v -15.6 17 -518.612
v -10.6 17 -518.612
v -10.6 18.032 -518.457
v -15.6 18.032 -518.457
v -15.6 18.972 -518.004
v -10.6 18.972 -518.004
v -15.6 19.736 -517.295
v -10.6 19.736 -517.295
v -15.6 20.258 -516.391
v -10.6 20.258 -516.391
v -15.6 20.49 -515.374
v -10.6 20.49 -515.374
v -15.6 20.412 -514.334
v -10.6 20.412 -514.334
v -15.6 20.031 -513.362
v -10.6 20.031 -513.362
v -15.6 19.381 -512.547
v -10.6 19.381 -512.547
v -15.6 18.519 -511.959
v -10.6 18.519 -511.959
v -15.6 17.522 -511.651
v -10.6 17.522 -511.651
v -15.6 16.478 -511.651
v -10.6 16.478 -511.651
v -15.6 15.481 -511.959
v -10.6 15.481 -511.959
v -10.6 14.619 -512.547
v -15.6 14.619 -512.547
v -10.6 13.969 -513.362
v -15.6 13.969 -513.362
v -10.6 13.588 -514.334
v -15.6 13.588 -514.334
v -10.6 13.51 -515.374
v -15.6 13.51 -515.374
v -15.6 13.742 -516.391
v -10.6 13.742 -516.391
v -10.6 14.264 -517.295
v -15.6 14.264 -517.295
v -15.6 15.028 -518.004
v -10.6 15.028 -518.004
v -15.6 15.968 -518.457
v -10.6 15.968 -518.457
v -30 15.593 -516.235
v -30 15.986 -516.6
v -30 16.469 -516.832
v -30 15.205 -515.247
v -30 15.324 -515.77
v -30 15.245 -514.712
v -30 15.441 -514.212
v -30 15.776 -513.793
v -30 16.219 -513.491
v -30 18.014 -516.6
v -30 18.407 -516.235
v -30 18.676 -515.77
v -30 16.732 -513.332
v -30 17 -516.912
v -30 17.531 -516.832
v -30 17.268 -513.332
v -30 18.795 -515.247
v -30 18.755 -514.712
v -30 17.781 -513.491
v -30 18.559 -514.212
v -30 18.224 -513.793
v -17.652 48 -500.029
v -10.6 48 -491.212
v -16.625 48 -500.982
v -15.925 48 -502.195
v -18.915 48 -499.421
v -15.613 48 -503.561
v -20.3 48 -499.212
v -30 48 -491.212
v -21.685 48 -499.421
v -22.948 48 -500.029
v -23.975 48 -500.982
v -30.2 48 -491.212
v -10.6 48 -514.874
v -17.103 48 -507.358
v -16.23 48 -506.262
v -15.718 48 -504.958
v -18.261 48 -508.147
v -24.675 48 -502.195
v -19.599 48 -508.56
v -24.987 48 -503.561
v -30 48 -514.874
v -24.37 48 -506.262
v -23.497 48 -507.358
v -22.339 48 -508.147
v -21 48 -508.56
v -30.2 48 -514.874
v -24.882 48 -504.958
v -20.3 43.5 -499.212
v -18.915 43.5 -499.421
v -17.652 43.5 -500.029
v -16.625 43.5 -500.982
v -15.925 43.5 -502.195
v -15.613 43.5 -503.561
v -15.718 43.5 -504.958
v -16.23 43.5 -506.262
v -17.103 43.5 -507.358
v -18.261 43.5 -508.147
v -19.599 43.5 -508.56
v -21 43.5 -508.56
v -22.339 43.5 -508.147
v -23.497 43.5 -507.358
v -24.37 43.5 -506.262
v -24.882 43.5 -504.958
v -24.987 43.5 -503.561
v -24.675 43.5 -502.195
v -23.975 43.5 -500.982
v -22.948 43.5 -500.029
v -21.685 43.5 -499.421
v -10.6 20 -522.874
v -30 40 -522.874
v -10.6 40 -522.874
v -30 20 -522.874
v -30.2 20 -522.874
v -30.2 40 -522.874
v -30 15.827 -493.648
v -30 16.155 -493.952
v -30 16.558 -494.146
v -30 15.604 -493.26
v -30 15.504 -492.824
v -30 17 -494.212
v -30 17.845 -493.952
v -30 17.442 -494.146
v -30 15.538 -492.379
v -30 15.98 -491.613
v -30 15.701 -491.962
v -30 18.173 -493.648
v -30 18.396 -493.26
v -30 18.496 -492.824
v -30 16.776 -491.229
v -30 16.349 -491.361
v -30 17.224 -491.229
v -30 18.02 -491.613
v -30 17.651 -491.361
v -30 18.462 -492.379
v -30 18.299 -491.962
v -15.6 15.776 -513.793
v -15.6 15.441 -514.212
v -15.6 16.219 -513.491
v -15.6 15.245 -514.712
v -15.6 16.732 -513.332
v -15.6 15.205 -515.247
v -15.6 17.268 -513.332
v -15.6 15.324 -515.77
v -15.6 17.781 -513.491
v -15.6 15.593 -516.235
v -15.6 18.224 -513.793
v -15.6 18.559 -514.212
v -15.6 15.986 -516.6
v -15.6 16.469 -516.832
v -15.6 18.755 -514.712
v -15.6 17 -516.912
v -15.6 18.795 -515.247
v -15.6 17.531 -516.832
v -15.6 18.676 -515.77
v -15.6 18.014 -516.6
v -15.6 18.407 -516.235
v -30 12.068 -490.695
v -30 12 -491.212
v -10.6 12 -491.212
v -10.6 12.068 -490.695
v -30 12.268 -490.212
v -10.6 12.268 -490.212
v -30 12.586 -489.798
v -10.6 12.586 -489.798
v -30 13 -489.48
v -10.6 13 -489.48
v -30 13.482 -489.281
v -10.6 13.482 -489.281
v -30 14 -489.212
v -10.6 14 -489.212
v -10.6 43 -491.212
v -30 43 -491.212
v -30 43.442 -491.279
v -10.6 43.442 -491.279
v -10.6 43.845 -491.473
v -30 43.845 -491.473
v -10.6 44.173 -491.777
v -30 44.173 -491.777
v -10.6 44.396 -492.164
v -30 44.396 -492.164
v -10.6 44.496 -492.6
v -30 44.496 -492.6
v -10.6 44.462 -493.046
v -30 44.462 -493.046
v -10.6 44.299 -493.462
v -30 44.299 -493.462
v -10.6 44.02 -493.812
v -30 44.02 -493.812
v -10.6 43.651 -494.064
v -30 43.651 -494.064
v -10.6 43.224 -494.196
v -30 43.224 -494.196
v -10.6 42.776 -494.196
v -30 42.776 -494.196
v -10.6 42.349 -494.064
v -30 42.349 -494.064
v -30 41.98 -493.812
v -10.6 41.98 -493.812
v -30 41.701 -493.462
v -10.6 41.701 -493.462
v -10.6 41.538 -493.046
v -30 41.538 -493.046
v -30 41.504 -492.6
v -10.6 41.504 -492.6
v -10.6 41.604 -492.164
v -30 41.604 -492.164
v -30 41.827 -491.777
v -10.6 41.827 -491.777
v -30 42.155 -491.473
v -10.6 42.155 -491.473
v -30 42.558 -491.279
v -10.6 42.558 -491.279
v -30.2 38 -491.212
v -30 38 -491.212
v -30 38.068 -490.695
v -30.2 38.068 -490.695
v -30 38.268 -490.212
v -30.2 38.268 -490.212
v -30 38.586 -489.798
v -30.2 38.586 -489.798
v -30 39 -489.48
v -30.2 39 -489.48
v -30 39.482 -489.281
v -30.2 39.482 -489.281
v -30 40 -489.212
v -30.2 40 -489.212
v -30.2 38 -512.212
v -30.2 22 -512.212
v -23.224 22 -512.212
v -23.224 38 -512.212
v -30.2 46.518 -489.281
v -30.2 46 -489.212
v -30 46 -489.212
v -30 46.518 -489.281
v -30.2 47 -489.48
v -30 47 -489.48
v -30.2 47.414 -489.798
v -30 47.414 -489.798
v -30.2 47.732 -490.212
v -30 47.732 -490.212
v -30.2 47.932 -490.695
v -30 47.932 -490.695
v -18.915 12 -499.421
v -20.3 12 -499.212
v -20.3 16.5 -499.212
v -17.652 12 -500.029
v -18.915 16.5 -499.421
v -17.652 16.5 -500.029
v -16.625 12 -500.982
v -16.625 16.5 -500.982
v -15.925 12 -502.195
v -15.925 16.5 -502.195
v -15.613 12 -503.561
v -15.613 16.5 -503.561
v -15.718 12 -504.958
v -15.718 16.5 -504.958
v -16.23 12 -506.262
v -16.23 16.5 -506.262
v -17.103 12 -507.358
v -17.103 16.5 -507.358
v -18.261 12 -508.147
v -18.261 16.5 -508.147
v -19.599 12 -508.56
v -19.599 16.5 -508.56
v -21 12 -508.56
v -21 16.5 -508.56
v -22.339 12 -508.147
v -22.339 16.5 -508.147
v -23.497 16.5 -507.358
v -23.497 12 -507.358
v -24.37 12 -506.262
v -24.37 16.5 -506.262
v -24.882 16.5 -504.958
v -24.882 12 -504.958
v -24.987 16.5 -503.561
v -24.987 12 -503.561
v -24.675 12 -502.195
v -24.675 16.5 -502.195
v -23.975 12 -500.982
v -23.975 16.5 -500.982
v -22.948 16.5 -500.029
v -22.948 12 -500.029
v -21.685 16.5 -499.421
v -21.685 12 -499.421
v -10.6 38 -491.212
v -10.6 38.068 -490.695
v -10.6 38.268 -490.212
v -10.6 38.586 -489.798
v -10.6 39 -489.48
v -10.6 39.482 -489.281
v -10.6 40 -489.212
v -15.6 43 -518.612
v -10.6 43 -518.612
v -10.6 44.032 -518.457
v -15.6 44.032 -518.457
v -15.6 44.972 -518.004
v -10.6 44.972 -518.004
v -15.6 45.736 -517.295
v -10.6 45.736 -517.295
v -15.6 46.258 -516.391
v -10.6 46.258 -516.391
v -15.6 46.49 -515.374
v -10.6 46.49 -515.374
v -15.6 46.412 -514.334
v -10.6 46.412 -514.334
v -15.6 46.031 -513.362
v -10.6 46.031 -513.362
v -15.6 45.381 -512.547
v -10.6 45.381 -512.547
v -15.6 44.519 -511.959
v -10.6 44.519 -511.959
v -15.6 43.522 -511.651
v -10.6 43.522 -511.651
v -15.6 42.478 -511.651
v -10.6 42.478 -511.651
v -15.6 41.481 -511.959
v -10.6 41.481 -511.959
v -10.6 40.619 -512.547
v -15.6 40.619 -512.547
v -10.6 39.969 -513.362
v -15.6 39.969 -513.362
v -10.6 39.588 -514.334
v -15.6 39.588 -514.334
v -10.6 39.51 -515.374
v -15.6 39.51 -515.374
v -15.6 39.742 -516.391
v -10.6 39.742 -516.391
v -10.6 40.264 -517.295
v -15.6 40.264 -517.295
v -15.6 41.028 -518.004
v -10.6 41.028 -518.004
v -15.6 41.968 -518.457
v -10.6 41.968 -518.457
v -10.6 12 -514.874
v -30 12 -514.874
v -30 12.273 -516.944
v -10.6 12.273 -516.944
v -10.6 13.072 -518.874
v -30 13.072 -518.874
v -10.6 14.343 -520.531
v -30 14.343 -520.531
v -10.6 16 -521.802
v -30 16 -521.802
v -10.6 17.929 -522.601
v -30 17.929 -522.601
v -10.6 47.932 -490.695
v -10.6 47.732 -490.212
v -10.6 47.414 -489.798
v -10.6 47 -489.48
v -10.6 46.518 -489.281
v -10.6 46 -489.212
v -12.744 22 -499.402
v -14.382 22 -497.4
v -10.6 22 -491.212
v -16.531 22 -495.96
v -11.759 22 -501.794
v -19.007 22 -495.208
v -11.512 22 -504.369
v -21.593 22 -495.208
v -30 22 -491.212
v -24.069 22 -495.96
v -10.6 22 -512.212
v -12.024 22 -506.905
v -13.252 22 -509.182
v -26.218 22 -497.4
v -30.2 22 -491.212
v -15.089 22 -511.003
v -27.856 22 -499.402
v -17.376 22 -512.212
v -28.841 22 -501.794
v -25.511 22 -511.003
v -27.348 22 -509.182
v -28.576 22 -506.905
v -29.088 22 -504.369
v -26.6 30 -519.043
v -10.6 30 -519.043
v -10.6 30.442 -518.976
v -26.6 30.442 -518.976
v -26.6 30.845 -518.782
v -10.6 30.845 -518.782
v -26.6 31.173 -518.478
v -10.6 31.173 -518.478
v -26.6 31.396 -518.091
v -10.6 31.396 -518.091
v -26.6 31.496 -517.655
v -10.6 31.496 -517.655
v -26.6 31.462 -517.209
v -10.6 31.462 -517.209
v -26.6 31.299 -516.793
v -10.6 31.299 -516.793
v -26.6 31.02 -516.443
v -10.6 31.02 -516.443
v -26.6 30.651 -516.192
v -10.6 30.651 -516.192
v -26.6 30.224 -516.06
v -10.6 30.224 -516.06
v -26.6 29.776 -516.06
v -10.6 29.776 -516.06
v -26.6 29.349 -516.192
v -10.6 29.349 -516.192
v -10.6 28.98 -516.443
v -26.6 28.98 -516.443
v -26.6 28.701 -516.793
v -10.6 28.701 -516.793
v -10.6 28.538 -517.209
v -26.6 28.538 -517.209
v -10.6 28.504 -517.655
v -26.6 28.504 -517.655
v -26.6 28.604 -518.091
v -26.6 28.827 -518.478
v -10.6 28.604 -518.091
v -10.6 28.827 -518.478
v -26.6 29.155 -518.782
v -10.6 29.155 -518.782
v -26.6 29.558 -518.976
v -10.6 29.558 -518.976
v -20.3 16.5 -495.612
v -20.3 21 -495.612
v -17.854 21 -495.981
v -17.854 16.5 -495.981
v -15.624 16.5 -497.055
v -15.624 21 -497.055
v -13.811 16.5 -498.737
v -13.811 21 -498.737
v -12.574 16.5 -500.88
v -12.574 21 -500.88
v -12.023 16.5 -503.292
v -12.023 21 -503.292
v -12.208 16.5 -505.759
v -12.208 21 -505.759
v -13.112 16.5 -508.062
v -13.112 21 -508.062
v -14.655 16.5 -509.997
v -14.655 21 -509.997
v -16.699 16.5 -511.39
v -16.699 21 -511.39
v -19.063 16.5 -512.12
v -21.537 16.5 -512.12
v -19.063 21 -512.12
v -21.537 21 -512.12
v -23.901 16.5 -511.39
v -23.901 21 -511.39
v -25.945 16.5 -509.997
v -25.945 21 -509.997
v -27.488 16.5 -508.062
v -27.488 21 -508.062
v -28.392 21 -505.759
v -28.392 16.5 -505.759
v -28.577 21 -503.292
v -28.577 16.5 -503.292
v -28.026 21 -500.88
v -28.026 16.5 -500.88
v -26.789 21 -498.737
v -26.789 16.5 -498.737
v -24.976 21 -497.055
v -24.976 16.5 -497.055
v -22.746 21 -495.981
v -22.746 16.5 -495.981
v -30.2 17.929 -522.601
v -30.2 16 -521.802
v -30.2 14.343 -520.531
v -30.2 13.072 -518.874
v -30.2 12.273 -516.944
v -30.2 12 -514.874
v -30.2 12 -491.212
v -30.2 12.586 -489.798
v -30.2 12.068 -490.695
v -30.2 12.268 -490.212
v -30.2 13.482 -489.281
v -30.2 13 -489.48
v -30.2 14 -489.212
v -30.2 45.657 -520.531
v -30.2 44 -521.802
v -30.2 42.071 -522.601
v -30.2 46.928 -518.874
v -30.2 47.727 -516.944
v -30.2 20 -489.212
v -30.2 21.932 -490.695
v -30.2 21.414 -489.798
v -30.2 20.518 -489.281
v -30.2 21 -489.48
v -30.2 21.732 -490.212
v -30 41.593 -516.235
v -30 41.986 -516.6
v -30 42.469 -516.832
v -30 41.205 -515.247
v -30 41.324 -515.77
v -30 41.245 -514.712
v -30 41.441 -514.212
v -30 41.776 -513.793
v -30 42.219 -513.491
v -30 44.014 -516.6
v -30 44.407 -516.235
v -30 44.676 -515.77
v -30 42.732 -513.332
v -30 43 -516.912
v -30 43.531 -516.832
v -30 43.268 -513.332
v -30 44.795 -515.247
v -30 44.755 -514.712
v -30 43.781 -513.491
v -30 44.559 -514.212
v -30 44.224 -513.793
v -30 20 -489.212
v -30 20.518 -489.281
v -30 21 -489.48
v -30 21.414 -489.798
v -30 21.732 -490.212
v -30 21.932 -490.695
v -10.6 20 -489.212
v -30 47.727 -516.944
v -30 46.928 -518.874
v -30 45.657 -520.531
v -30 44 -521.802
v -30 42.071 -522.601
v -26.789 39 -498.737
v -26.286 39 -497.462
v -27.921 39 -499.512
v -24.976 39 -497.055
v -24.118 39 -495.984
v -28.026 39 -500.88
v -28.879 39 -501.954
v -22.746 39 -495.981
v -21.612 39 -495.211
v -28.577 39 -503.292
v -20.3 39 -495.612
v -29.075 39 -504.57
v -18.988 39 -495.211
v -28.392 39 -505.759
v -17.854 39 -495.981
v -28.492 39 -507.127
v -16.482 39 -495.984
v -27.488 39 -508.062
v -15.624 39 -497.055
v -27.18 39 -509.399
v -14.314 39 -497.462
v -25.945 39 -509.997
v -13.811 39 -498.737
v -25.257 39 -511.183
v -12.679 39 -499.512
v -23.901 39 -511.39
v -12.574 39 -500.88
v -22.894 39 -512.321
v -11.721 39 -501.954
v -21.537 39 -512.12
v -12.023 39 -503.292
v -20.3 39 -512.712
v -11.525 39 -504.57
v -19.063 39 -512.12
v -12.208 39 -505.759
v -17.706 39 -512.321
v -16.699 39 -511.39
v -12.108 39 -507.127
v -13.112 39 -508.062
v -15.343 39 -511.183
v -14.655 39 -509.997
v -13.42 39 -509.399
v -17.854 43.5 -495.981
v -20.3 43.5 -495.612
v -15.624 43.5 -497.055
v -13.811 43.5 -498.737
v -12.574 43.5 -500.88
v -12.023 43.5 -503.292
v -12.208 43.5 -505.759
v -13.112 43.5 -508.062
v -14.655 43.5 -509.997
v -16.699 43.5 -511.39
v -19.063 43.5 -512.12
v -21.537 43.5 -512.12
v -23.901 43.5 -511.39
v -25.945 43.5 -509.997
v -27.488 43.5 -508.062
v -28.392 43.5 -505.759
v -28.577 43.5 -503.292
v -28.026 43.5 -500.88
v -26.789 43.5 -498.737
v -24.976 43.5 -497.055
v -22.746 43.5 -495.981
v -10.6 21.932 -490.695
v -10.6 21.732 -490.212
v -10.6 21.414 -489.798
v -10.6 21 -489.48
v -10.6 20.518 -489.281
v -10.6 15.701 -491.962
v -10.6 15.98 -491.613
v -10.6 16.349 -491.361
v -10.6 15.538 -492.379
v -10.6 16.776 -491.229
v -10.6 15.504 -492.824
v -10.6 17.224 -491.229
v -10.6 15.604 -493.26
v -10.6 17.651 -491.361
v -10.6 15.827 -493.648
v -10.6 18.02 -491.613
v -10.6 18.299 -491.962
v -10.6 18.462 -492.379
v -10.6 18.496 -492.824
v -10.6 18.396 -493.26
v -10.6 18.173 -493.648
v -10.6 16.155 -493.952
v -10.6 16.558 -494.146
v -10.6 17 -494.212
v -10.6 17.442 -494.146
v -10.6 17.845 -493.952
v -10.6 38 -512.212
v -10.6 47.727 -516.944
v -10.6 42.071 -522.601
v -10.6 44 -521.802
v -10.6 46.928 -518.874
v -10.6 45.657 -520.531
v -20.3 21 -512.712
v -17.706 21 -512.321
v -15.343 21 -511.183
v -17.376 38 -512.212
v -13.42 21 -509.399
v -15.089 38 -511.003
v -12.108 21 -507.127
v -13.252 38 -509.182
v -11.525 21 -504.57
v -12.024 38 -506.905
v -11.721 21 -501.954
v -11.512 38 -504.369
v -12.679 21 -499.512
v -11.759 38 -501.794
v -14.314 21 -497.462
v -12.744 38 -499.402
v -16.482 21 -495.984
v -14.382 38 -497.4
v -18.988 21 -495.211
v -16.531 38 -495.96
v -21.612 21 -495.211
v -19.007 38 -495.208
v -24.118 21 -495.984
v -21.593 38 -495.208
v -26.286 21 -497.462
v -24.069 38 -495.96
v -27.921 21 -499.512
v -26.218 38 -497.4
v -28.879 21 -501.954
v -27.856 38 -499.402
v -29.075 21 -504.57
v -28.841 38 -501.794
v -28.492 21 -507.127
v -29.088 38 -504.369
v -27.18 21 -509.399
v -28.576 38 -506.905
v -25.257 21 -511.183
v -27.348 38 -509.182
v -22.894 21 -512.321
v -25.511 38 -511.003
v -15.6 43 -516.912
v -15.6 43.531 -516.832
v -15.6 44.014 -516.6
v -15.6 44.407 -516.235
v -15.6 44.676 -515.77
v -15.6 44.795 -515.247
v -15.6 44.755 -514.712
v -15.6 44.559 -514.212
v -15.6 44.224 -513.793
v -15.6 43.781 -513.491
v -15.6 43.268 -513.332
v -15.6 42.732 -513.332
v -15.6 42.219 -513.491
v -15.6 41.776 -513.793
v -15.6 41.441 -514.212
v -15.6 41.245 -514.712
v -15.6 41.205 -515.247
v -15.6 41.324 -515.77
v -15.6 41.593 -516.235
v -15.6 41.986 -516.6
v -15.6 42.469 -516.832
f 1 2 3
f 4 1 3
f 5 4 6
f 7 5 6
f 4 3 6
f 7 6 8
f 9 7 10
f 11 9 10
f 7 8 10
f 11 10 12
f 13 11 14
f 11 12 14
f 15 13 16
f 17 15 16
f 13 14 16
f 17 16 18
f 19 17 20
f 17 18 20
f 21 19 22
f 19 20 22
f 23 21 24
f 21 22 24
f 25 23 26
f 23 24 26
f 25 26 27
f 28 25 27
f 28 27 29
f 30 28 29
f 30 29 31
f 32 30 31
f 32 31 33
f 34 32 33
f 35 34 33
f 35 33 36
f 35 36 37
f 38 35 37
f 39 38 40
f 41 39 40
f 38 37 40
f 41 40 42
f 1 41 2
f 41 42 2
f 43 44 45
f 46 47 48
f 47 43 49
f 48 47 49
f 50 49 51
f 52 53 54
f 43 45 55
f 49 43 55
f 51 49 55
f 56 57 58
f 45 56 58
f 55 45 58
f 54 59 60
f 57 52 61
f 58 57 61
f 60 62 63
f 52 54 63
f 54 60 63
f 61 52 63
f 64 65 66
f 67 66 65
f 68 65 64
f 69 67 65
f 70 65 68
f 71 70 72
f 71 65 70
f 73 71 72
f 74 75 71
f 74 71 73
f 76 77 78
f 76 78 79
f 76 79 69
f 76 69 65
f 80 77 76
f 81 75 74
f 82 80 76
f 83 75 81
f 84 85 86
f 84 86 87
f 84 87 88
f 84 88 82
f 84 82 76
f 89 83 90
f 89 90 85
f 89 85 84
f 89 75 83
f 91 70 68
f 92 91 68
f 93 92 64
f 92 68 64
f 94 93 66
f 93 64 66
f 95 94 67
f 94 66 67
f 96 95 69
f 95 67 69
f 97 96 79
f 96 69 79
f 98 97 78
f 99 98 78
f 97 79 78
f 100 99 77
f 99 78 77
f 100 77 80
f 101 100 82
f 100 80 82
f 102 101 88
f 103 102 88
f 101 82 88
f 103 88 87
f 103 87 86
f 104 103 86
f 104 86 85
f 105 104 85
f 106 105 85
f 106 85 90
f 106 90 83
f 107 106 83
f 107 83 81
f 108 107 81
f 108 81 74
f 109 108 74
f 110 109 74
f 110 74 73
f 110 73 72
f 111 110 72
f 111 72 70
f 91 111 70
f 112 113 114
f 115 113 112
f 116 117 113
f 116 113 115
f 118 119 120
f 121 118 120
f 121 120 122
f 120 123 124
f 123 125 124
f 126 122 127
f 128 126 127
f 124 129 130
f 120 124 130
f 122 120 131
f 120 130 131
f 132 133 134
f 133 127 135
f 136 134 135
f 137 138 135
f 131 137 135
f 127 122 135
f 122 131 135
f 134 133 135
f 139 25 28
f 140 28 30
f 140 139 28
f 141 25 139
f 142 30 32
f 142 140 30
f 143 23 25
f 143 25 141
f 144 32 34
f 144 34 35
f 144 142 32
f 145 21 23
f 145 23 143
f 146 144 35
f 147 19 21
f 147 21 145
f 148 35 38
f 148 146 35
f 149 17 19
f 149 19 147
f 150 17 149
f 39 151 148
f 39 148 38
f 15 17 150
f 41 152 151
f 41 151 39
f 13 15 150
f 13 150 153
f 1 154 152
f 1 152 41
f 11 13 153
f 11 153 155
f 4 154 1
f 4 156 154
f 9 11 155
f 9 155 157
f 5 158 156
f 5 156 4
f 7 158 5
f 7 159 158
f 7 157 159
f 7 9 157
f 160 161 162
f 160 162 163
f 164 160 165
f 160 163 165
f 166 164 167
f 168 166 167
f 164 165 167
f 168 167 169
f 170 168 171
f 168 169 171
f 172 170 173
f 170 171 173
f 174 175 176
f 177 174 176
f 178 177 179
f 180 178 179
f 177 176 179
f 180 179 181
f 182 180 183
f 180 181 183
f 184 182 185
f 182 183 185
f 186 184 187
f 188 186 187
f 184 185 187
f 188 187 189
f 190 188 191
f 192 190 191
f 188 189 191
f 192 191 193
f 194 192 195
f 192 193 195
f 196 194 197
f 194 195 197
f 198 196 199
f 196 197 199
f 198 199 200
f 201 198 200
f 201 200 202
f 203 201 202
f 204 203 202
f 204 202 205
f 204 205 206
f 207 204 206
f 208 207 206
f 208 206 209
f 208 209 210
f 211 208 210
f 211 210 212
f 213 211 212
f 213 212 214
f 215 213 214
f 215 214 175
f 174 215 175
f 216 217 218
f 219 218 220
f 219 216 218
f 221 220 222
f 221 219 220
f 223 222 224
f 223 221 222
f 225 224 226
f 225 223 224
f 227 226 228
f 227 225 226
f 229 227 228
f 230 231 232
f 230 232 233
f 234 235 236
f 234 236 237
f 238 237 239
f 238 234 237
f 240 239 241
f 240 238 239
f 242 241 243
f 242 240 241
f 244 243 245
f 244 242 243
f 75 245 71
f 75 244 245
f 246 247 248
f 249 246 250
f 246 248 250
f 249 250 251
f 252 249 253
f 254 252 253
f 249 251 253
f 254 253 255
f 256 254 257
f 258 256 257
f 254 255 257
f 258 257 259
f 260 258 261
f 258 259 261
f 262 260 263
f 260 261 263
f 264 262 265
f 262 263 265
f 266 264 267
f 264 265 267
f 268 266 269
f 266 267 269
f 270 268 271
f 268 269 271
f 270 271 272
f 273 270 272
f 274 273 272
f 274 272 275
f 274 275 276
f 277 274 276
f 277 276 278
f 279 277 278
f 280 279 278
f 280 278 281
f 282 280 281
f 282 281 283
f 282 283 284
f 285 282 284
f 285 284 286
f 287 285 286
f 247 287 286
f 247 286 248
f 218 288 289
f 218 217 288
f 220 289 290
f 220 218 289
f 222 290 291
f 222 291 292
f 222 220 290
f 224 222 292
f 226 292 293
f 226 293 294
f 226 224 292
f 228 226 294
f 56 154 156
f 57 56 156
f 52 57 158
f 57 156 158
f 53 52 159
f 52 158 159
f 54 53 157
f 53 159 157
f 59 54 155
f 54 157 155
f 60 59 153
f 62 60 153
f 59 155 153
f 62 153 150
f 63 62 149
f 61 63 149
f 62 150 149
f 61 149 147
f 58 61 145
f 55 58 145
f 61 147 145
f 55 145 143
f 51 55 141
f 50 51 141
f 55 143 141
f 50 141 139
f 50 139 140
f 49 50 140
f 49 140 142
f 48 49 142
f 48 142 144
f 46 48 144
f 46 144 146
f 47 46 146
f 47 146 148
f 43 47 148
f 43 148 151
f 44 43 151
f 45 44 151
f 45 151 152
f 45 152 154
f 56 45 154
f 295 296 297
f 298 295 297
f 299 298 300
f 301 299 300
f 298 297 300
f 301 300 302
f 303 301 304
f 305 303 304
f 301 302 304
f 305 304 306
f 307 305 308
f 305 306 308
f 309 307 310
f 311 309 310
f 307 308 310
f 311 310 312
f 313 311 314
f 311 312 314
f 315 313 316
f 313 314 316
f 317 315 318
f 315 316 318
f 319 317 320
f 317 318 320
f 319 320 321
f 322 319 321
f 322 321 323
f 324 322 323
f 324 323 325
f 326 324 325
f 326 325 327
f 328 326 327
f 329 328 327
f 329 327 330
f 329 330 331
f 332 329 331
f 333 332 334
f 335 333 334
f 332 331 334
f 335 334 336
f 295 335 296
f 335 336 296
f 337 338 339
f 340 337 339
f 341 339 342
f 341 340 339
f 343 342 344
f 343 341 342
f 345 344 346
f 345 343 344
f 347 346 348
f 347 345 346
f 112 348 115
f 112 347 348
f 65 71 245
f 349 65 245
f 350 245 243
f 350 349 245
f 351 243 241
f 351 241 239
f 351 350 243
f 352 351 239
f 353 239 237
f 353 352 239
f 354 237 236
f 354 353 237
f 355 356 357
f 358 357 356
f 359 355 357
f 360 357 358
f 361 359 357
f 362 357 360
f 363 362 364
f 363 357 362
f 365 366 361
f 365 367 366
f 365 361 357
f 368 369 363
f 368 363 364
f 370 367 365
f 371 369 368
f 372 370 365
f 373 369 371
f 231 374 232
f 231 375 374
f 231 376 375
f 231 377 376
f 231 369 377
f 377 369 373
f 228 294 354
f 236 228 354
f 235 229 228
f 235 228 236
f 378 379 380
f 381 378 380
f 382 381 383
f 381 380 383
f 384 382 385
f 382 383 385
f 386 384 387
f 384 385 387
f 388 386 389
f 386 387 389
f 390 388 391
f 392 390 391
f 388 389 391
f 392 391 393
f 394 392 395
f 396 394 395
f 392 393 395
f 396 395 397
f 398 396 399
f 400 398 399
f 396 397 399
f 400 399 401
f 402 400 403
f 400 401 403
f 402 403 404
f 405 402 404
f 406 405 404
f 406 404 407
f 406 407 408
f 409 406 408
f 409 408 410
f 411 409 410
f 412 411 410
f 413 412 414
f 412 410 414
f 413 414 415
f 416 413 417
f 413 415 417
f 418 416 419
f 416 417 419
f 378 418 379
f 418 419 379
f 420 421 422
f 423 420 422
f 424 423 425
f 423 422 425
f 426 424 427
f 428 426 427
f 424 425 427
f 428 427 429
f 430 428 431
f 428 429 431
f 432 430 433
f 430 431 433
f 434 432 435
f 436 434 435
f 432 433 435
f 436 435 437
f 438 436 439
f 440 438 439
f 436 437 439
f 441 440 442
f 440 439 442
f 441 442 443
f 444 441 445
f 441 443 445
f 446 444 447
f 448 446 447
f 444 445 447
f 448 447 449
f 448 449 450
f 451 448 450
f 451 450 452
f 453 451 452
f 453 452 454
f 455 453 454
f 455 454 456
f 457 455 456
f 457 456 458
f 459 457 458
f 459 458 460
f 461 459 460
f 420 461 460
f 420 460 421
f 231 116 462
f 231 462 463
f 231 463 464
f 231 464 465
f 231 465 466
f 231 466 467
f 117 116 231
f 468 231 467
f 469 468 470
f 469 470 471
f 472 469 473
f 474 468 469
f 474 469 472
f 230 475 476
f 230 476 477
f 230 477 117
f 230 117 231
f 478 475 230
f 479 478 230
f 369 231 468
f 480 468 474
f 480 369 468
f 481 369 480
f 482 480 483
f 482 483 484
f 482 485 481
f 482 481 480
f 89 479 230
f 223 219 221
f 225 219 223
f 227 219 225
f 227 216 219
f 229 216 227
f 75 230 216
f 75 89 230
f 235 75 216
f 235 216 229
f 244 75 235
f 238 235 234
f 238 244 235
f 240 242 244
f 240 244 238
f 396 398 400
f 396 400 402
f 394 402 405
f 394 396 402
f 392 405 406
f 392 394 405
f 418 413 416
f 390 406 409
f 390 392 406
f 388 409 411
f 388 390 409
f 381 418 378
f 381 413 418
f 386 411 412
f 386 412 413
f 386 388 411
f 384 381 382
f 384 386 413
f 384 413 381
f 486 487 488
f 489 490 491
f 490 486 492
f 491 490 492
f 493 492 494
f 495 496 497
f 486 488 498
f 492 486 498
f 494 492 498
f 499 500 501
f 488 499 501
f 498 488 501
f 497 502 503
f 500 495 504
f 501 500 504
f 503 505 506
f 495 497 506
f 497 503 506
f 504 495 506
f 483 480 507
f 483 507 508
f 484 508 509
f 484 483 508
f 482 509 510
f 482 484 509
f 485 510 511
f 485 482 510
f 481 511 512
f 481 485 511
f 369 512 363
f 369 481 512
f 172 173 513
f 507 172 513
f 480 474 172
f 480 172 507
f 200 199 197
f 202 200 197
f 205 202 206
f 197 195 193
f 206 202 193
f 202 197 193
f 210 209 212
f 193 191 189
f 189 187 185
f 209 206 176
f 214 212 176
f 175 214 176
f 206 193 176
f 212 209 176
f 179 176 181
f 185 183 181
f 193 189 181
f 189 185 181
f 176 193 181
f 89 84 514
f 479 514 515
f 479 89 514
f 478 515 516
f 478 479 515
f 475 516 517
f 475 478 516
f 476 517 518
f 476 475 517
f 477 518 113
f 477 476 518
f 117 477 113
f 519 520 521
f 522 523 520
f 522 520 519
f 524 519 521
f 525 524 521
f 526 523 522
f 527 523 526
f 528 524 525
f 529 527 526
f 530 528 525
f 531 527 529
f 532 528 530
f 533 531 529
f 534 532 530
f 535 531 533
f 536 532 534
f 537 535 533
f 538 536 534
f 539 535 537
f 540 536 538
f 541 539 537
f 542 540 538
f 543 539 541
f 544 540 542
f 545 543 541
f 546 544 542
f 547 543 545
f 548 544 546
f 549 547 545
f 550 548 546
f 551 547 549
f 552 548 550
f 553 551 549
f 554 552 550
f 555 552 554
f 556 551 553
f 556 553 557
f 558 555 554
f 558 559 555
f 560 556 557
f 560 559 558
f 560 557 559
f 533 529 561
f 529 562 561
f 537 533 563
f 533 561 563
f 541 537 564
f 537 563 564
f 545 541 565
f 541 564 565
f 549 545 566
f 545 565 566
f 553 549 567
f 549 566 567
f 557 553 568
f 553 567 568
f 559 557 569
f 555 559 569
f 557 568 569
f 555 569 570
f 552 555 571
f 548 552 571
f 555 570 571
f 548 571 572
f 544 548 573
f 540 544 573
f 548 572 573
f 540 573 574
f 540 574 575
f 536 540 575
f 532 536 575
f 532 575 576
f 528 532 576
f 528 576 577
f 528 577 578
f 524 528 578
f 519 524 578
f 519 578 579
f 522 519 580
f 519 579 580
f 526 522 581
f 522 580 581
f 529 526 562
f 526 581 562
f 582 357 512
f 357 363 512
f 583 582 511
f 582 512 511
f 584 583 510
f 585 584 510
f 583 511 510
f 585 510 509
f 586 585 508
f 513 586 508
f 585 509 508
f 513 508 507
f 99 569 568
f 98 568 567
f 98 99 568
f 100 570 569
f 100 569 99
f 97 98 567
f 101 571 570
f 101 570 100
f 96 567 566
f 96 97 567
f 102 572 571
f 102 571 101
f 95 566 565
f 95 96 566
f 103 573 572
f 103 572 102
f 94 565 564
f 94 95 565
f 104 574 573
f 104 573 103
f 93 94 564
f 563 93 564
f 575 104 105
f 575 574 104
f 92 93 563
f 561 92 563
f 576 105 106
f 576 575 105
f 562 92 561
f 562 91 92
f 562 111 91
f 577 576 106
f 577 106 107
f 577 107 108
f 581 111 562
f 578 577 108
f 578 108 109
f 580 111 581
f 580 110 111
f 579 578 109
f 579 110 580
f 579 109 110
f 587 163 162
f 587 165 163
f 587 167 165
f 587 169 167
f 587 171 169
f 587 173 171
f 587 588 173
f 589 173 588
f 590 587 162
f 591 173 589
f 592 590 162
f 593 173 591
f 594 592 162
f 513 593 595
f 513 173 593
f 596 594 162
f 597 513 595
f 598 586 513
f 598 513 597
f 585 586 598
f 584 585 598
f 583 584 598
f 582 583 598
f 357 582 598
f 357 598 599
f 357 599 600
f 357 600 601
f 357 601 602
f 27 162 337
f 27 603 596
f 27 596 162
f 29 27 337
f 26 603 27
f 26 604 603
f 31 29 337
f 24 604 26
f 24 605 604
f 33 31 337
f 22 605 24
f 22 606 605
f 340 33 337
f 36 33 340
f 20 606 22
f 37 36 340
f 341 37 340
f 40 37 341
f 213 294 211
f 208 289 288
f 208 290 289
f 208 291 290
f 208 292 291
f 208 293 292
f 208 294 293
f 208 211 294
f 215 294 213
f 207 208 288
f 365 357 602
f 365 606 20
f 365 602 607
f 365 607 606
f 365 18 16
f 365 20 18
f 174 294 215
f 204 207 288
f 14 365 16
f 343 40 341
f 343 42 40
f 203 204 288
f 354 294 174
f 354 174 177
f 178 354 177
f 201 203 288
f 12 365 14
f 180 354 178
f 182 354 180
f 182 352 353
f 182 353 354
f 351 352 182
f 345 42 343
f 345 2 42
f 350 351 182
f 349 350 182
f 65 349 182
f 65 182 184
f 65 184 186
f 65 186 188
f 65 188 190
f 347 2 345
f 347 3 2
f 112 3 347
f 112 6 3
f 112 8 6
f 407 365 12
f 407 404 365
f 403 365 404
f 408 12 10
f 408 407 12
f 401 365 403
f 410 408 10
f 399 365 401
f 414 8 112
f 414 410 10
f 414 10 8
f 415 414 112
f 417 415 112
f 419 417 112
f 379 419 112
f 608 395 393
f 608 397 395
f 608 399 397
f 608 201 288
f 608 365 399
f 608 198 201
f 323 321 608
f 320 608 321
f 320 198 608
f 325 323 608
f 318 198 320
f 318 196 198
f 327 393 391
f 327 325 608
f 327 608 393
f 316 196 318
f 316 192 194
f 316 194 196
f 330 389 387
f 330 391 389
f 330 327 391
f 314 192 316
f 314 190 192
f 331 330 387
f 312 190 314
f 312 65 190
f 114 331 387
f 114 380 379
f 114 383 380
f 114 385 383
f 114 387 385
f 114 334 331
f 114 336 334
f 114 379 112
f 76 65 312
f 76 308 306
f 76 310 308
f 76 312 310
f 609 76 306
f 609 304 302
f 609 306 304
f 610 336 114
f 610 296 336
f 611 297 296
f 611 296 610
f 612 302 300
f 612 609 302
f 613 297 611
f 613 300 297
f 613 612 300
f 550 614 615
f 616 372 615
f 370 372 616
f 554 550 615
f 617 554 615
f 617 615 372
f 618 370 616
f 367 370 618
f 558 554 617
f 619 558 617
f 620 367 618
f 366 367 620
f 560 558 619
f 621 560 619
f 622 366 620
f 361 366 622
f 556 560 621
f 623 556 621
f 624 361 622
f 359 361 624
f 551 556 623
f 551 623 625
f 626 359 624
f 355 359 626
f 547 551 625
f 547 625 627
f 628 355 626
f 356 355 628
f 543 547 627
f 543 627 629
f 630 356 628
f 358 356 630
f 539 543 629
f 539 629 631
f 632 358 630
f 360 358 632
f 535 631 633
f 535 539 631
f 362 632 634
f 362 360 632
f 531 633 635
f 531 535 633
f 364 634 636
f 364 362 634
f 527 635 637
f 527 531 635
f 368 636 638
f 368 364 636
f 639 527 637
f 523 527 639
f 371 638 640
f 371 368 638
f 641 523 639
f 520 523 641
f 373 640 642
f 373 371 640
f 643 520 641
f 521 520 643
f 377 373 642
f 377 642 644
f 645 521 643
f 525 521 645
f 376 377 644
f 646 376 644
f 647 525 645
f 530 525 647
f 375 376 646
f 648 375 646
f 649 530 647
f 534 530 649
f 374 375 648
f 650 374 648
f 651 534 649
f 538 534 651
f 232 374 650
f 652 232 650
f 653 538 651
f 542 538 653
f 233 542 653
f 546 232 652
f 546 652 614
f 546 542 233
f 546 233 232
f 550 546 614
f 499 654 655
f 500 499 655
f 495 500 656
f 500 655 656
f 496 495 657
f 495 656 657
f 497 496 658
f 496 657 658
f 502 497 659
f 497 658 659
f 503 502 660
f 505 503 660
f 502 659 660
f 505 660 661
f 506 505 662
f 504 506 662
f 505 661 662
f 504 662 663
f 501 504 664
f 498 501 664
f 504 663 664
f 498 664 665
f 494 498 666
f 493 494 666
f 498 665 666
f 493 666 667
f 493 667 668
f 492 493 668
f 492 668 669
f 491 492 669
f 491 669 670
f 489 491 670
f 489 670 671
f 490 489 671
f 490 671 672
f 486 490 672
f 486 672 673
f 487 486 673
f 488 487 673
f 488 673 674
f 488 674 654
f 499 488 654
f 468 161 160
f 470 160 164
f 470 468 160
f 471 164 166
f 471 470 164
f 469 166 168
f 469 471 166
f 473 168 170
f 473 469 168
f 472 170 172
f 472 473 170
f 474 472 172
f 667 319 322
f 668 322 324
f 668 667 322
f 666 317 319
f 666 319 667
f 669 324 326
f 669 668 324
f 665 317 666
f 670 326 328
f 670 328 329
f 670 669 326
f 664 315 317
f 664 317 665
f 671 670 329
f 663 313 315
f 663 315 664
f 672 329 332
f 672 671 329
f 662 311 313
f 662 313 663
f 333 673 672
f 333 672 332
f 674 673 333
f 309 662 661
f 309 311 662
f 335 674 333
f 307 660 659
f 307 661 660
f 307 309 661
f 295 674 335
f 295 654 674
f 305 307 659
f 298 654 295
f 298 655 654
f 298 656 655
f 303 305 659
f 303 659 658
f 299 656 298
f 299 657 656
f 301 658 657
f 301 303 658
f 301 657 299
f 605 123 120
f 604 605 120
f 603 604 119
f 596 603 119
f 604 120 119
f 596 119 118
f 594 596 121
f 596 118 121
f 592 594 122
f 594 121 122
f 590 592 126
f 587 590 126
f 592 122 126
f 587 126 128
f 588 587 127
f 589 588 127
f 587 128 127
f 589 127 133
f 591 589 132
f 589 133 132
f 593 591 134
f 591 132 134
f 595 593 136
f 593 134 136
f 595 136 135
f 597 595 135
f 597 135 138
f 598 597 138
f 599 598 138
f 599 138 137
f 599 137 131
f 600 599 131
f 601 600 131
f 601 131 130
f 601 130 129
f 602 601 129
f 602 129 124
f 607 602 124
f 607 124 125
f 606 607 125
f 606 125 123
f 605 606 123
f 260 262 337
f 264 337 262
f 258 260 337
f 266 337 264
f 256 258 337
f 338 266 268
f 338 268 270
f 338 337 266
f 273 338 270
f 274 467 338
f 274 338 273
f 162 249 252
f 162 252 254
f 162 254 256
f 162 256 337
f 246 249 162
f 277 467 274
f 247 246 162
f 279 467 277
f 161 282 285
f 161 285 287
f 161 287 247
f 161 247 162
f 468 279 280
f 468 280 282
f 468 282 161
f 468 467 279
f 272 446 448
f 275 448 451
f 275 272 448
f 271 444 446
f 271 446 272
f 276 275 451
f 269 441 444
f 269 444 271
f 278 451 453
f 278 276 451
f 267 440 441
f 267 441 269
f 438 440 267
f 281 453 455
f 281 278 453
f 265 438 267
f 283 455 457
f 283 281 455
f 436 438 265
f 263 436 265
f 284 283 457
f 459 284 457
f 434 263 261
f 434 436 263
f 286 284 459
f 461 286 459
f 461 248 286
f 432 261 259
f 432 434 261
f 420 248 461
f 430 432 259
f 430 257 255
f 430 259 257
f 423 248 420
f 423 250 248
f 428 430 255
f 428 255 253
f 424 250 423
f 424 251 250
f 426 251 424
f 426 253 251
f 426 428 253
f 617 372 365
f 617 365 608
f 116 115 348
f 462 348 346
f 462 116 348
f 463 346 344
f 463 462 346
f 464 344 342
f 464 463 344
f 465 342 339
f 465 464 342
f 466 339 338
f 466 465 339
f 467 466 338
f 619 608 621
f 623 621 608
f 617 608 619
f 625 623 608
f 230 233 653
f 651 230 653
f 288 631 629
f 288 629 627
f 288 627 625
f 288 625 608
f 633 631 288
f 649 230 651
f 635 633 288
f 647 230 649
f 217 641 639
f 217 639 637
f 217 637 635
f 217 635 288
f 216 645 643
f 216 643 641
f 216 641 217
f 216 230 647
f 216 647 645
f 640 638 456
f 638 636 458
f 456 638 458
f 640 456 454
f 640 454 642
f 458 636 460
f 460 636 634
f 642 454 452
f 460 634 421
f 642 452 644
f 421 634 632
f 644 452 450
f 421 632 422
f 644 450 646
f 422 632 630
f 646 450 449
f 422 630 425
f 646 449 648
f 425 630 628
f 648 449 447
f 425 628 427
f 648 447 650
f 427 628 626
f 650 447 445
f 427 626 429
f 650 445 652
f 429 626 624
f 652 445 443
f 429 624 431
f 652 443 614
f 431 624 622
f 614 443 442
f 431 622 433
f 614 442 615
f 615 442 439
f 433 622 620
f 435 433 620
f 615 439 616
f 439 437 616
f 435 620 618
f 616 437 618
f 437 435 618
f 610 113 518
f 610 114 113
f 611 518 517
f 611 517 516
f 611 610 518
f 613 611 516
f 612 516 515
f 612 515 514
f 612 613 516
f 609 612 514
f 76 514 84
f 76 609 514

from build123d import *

# Parameters (mm, degrees)
SZKIC1_R                         = 3
DODANIE_WYCI_GNI_CIE1_DEPTH      = 60
WYTNIJ_WYCI_GNI_CIE1_START       = 43
SZKIC1_4_R                       = 8.3
WYTNIJ_WYCI_GNI_CIE1_DEPTH       = 26
WYTNIJ_WYCI_GNI_CIE2_START       = 38
WYTNIJ_WYCI_GNI_CIE2_DEPTH       = 16
WYTNIJ_WYCI_GNI_CIE3_START       = -12
WYTNIJ_WYCI_GNI_CIE3_DEPTH       = 12
WYTNIJ_WYCI_GNI_CIE4_DEPTH       = 12
WYTNIJ_WYCI_GNI_CIE5_START       = -26
WYTNIJ_WYCI_GNI_CIE5_DEPTH       = 16
SZKIC7_W                         = 1.4
SZKIC7_H                         = 16
WYTNIJ_WYCI_GNI_CIE6_DEPTH       = 527.501957094
SZKIC8_W                         = 5
SZKIC8_H                         = 10
DODANIE_WYCI_GNI_CIE2_DEPTH      = 16
DODANIE_WYCI_GNI_CIE3_DEPTH      = 10
DODANIE_WYCI_GNI_CIE4_DEPTH      = 10
SZKIC11_W                        = 6.4
SZKIC11_H                        = 16
DODANIE_WYCI_GNI_CIE5_DEPTH      = 11
DODANIE_WYCI_GNI_CIE6_DEPTH      = 10
DODANIE_WYCI_GNI_CIE7_START      = -10
DODANIE_WYCI_GNI_CIE7_DEPTH      = 10
SZKIC15_W                        = 6.4
SZKIC15_H                        = 16
DODANIE_WYCI_GNI_CIE8_DEPTH      = 3.4
SZKIC8_3_R                       = 1.5
WYTNIJ_WYCI_GNI_CIE7_DEPTH       = 527.66242587
SZKIC16_R                        = 4.7
WYTNIJ_WYCI_GNI_CIE8_DEPTH       = 526.928654544
WYTNIJ_WYCI_GNI_CIE9_START       = -0.5
SZKIC17_R                        = 8.3
WYTNIJ_WYCI_GNI_CIE9_DEPTH       = 0.5
SZKIC18_R                        = 8.3
WYTNIJ_WYCI_GNI_CIE10_DEPTH      = 0.5
SZKIC19_W                        = 28.661365339
SZKIC19_H                        = 12
WYTNIJ_WYCI_GNI_CIE11_DEPTH      = 527.501957094
SZKIC20_W                        = 4.261365339
SZKIC20_H                        = 36
DODANIE_WYCI_GNI_CIE9_DEPTH      = 14.4
SZKIC21_R                        = 1.8
SZKIC21_R_2                      = 1.5
WYTNIJ_WYCI_GNI_CIE12_DEPTH      = 526.430595629
SZKIC21_3_R                      = 1.5
WYTNIJ_WYCI_GNI_CIE13_DEPTH      = 16
ZAOKR_GLENIE1_R                  = 8
ZAOKR_GLENIE2_R                  = 2
SZKIC22_R                        = 3.5
WYTNIJ_WYCI_GNI_CIE14_DEPTH      = 5
WYTNIJ_WYCI_GNI_CIE15_DEPTH      = 17
WYTNIJ_WYCI_GNI_CIE15_DEPTH_BACK = 1
SZKIC23_R                        = 8.8
DODANIE_WYCI_GNI_CIE10_START     = 0.2
DODANIE_WYCI_GNI_CIE10_DEPTH     = 0.2


with BuildPart() as part:
    # Szkic1 → Dodanie-wyciągnięcie1 (new body)
    with BuildSketch(Plane(origin=(0, 0, 0), x_dir=(1, 0, 0), z_dir=(0, 1, 0))):
        with BuildLine():
            Line((-24.999980785, 522.873742718), (-29.999980785, 522.873742718))
            Line((-29.999980785, 522.873742718), (-29.999980785, 494.212377379))
            Line((-29.999980785, 494.212377379), (-20.299980785, 494.212377379))
            ThreePointArc((-20.299980785, 494.212377379), (-10.599980785, 503.912377379), (-20.299980785, 513.612377379))
            Line((-20.299980785, 513.612377379), (-24.999980785, 513.612377379))
            Line((-24.999980785, 513.612377379), (-24.999980785, 522.873742718))
        make_face()
        with Locations(Location((-20.299980785, 503.912377379, 0), (0, 0, 270))):
            Circle(SZKIC1_R, mode=Mode.SUBTRACT)
    extrude(amount=DODANIE_WYCI_GNI_CIE1_DEPTH)

    # Szkic1<4> → Wytnij-wyciągnięcie1 (cut)
    with BuildSketch(Plane(origin=(0, 0, 0), x_dir=(1, 0, 0), z_dir=(0, 1, 0)).offset(WYTNIJ_WYCI_GNI_CIE1_START)):
        with Locations(Location((-20.299980785, 503.912377379, 0), (0, 0, 270))):
            Circle(SZKIC1_4_R)
    extrude(amount=-WYTNIJ_WYCI_GNI_CIE1_DEPTH, mode=Mode.SUBTRACT)

    # Szkic1<6> → Wytnij-wyciągnięcie2 (cut)
    with BuildSketch(Plane(origin=(0, 0, 0), x_dir=(1, 0, 0), z_dir=(0, 1, 0)).offset(WYTNIJ_WYCI_GNI_CIE2_START)):
        with BuildLine():
            Line((-20.299980785, 512.212377379), (-29.999980785, 512.212377379))
            Line((-29.999980785, 512.212377379), (-29.999980785, 495.612377379))
            Line((-29.999980785, 495.612377379), (-20.299980785, 495.612377379))
            ThreePointArc((-20.299980785, 495.612377379), (-28.599980785, 503.912377379), (-20.299980785, 512.212377379))
        make_face()
    extrude(amount=-WYTNIJ_WYCI_GNI_CIE2_DEPTH, mode=Mode.SUBTRACT)

    # Szkic3 → Wytnij-wyciągnięcie3 (cut)
    with BuildSketch(Plane(origin=(0, 60, 0), x_dir=(1, 0, 0), z_dir=(0, 1, 0)).offset(WYTNIJ_WYCI_GNI_CIE3_START)):
        with BuildLine():
            Line((-24.999980785, 513.612377379), (-24.999980785, 494.212377379))
            Line((-24.999980785, 494.212377379), (-20.299980785, 494.212377379))
            ThreePointArc((-20.299980785, 494.212377379), (-10.599980785, 503.912377379), (-20.299980785, 513.612377379))
            Line((-20.299980785, 513.612377379), (-24.999980785, 513.612377379))
        make_face()
    extrude(amount=WYTNIJ_WYCI_GNI_CIE3_DEPTH, mode=Mode.SUBTRACT)

    # Szkic5 → Wytnij-wyciągnięcie4 (cut)
    with BuildSketch(Plane.XZ):
        with BuildLine():
            Line((-24.999980785, -513.612377379), (-20.299980785, -513.612377379))
            ThreePointArc((-20.299980785, -513.612377379), (-10.599980785, -503.912377379), (-20.299980785, -494.212377379))
            Line((-20.299980785, -494.212377379), (-24.999980785, -494.212377379))
            Line((-24.999980785, -494.212377379), (-24.999980785, -513.612377379))
        make_face()
    extrude(amount=-WYTNIJ_WYCI_GNI_CIE4_DEPTH, mode=Mode.SUBTRACT)

    # Szkic6 → Wytnij-wyciągnięcie5 (cut)
    with BuildSketch(Plane(origin=(0, 48, 0), x_dir=(1, 0, 0), z_dir=(0, 1, 0)).offset(WYTNIJ_WYCI_GNI_CIE5_START)):
        with BuildLine():
            Line((-20.299980785, 513.612377379), (-24.999980785, 513.612377379))
            Line((-24.999980785, 513.612377379), (-24.999980785, 494.212377379))
            Line((-24.999980785, 494.212377379), (-20.299980785, 494.212377379))
            ThreePointArc((-20.299980785, 494.212377379), (-10.599980785, 503.912377379), (-20.299980785, 513.612377379))
        make_face()
    extrude(amount=WYTNIJ_WYCI_GNI_CIE5_DEPTH, mode=Mode.SUBTRACT)

    # Szkic7 → Wytnij-wyciągnięcie6 (cut, through all)
    with BuildSketch(Plane(origin=(-24.999980785, 0, 0), x_dir=(0, 0, -1), z_dir=(1, 0, 0))):
        with Locations((494.912377379, 30)):
            Rectangle(SZKIC7_W, SZKIC7_H)
    extrude(amount=-WYTNIJ_WYCI_GNI_CIE6_DEPTH, mode=Mode.SUBTRACT)

    # Szkic8 → Dodanie-wyciągnięcie2 (add)
    with BuildSketch(Plane.ZY.offset(29.999980785)):
        with Locations((-491.712377379, 43)):
            Rectangle(SZKIC8_W, SZKIC8_H)
        with Locations((-516.112377379, 43)):
            Rectangle(SZKIC8_W, SZKIC8_H)
        with Locations((-516.112377379, 17)):
            Rectangle(SZKIC8_W, SZKIC8_H)
        with Locations((-491.712377379, 17)):
            Rectangle(SZKIC8_W, SZKIC8_H)
    extrude(amount=-DODANIE_WYCI_GNI_CIE2_DEPTH)

    # Szkic9 → Dodanie-wyciągnięcie3 (add)
    with BuildSketch(Plane.XZ.offset(-12)):
        with BuildLine():
            Line((-13.999980785, -513.612377379), (-20.299980785, -513.612377379))
            ThreePointArc((-20.299980785, -513.612377379), (-16.942426987, -513.012752783), (-13.999980785, -511.288012944))
            Line((-13.999980785, -511.288012944), (-13.999980785, -513.612377379))
        make_face()
        with BuildLine():
            Line((-13.999980785, -494.212377379), (-20.299980785, -494.212377379))
            ThreePointArc((-20.299980785, -494.212377379), (-16.942426987, -494.812001974), (-13.999980785, -496.536741813))
            Line((-13.999980785, -496.536741813), (-13.999980785, -494.212377379))
        make_face()
    extrude(amount=-DODANIE_WYCI_GNI_CIE3_DEPTH)

    # Szkic10 → Dodanie-wyciągnięcie4 (add)
    with BuildSketch(Plane.XZ.offset(-38)):
        with BuildLine():
            Line((-13.999980785, -513.612377379), (-20.299980785, -513.612377379))
            ThreePointArc((-20.299980785, -513.612377379), (-16.942426987, -513.012752783), (-13.999980785, -511.288012944))
            Line((-13.999980785, -511.288012944), (-13.999980785, -513.612377379))
        make_face()
        with BuildLine():
            Line((-13.999980785, -494.212377379), (-13.999980785, -496.536741813))
            ThreePointArc((-13.999980785, -496.536741813), (-16.942426987, -494.812001974), (-20.299980785, -494.212377379))
            Line((-20.299980785, -494.212377379), (-13.999980785, -494.212377379))
        make_face()
    extrude(amount=-DODANIE_WYCI_GNI_CIE4_DEPTH)

    # Szkic11 → Dodanie-wyciągnięcie5 (add)
    with BuildSketch(Plane(origin=(-24.999980785, 0, 0), x_dir=(0, 0, -1), z_dir=(1, 0, 0))):
        with Locations((515.412377379, 30)):
            Rectangle(SZKIC11_W, SZKIC11_H)
    extrude(amount=DODANIE_WYCI_GNI_CIE5_DEPTH)

    # Szkic12 → Dodanie-wyciągnięcie6 (add)
    with BuildSketch(Plane.XZ.offset(-12)):
        with BuildLine():
            ThreePointArc((-13.999980785, -496.536741813), (-11.490894566, -499.851589278), (-10.599980785, -503.912377379))
            Line((-10.599980785, -503.912377379), (-10.599980785, -489.212377379))
            Line((-10.599980785, -489.212377379), (-13.999980785, -489.212377379))
            Line((-13.999980785, -489.212377379), (-13.999980785, -496.536741813))
        make_face()
        with BuildLine():
            Line((-13.999980785, -511.288012944), (-13.999980785, -518.612377379))
            Line((-13.999980785, -518.612377379), (-10.599980785, -518.612377379))
            Line((-10.599980785, -518.612377379), (-10.599980785, -503.912377379))
            ThreePointArc((-10.599980785, -503.912377379), (-11.490894566, -507.973165479), (-13.999980785, -511.288012944))
        make_face()
    extrude(amount=-DODANIE_WYCI_GNI_CIE6_DEPTH)

    # Szkic13 → Dodanie-wyciągnięcie7 (add)
    with BuildSketch(Plane(origin=(0, 48, 0), x_dir=(1, 0, 0), z_dir=(0, 1, 0)).offset(DODANIE_WYCI_GNI_CIE7_START)):
        with BuildLine():
            ThreePointArc((-13.999980785, 511.288012944), (-11.490894566, 507.973165479), (-10.599980785, 503.912377379))
            Line((-10.599980785, 503.912377379), (-10.599980785, 518.612377379))
            Line((-10.599980785, 518.612377379), (-13.999980785, 518.612377379))
            Line((-13.999980785, 518.612377379), (-13.999980785, 511.288012944))
        make_face()
        with BuildLine():
            Line((-13.999980785, 489.212377379), (-10.599980785, 489.212377379))
            Line((-10.599980785, 489.212377379), (-10.599980785, 503.912377379))
            ThreePointArc((-10.599980785, 503.912377379), (-11.490894566, 499.851589278), (-13.999980785, 496.536741813))
            Line((-13.999980785, 496.536741813), (-13.999980785, 489.212377379))
        make_face()
    extrude(amount=DODANIE_WYCI_GNI_CIE7_DEPTH)

    # Szkic15 → Dodanie-wyciągnięcie8 (add)
    with BuildSketch(Plane(origin=(-13.999980785, 0, 0), x_dir=(0, 0, -1), z_dir=(1, 0, 0))):
        with Locations((515.412377379, 30)):
            Rectangle(SZKIC15_W, SZKIC15_H)
    extrude(amount=DODANIE_WYCI_GNI_CIE8_DEPTH)

    # Szkic8<3> → Wytnij-wyciągnięcie7 (cut, through all)
    with BuildSketch(Plane.ZY.offset(29.999980785)):
        with Locations((-492.712377379, 43)):
            Circle(SZKIC8_3_R)
        with Locations(Location((-515.112377379, 43, 0), (0, 0, 180))):
            Circle(SZKIC8_3_R)
        with Locations((-515.112377379, 17)):
            Circle(SZKIC8_3_R)
        with Locations(Location((-492.712377379, 17, 0), (0, 0, 180))):
            Circle(SZKIC8_3_R)
    extrude(amount=-WYTNIJ_WYCI_GNI_CIE7_DEPTH, mode=Mode.SUBTRACT)

    # Szkic16 → Wytnij-wyciągnięcie8 (cut, through all)
    with BuildSketch(Plane(origin=(0, 48, 0), x_dir=(1, 0, 0), z_dir=(0, 1, 0))):
        with Locations(Location((-20.299980785, 503.912377379, 0), (0, 0, 270))):
            Circle(SZKIC16_R)
    extrude(amount=-WYTNIJ_WYCI_GNI_CIE8_DEPTH, mode=Mode.SUBTRACT)

    # Szkic17 → Wytnij-wyciągnięcie9 (cut)
    with BuildSketch(Plane.XZ.offset(-43).offset(WYTNIJ_WYCI_GNI_CIE9_START)):
        with Locations(Location((-20.299980785, -503.912377379, 0), (0, 0, 90))):
            Circle(SZKIC17_R)
    extrude(amount=WYTNIJ_WYCI_GNI_CIE9_DEPTH, mode=Mode.SUBTRACT)

    # Szkic18 → Wytnij-wyciągnięcie10 (cut)
    with BuildSketch(Plane(origin=(0, 17, 0), x_dir=(1, 0, 0), z_dir=(0, 1, 0))):
        with Locations(Location((-20.299980785, 503.912377379, 0), (0, 0, 270))):
            Circle(SZKIC18_R)
    extrude(amount=-WYTNIJ_WYCI_GNI_CIE10_DEPTH, mode=Mode.SUBTRACT)

    # Szkic19 → Wytnij-wyciągnięcie11 (cut, through all)
    with BuildSketch(Plane(origin=(-24.999980785, 0, 0), x_dir=(0, 0, -1), z_dir=(1, 0, 0))):
        with Locations((508.543060049, 54)):
            Rectangle(SZKIC19_W, SZKIC19_H)
        with Locations((508.543060049, 6)):
            Rectangle(SZKIC19_W, SZKIC19_H)
    extrude(amount=-WYTNIJ_WYCI_GNI_CIE11_DEPTH, mode=Mode.SUBTRACT)

    # Szkic20 → Dodanie-wyciągnięcie9 (add)
    with BuildSketch(Plane(origin=(-24.999980785, 0, 0), x_dir=(0, 0, -1), z_dir=(1, 0, 0))):
        with Locations((520.743060048, 30)):
            Rectangle(SZKIC20_W, SZKIC20_H)
    extrude(amount=DODANIE_WYCI_GNI_CIE9_DEPTH)

    # Szkic21 → Wytnij-wyciągnięcie12 (cut, through all)
    # profile 1 of 2: a face of its own
    with BuildSketch(Plane(origin=(-10.599980785, 0, 0), x_dir=(0, 0, -1), z_dir=(1, 0, 0))):
        with Locations((515.112377379, 43)):
            Circle(SZKIC21_R)
        with Locations((515.112377379, 43)):
            Circle(SZKIC21_R_2, mode=Mode.SUBTRACT)
    # profile 2 of 2: a face of its own
    with BuildSketch(Plane(origin=(-10.599980785, 0, 0), x_dir=(0, 0, -1), z_dir=(1, 0, 0))):
        with Locations((515.112377379, 17)):
            Circle(SZKIC21_R)
        with Locations((515.112377379, 17)):
            Circle(SZKIC21_R_2, mode=Mode.SUBTRACT)
    extrude(amount=-WYTNIJ_WYCI_GNI_CIE12_DEPTH, mode=Mode.SUBTRACT)

    # Szkic21<3> → Wytnij-wyciągnięcie13 (cut)
    with BuildSketch(Plane(origin=(-10.599980785, 0, 0), x_dir=(0, 0, -1), z_dir=(1, 0, 0))):
        with Locations((517.543060048, 30)):
            Circle(SZKIC21_3_R)
    extrude(amount=-WYTNIJ_WYCI_GNI_CIE13_DEPTH, mode=Mode.SUBTRACT)

    # Zaokrąglenie1
    zaokr_glenie1_edges = [part.edges().sort_by_distance(p)[0] for p in [
        (-20.299980785, 48, -522.873742718),
        (-20.299980785, 12, -522.873742718),
    ]]
    fillet(zaokr_glenie1_edges, radius=ZAOKR_GLENIE1_R)

    # Zaokrąglenie2
    zaokr_glenie2_edges = [part.edges().sort_by_distance(p)[0] for p in [
        (-20.299980785, 48, -489.212377379),
        (-20.299980785, 38, -489.212377379),
        (-20.299980785, 22, -489.212377379),
        (-20.299980785, 12, -489.212377379),
    ]]
    fillet(zaokr_glenie2_edges, radius=ZAOKR_GLENIE2_R)

    # Szkic22 → Wytnij-wyciągnięcie14 (cut)
    with BuildSketch(Plane(origin=(-10.599980785, 0, 0), x_dir=(0, 0, -1), z_dir=(1, 0, 0))):
        with Locations((515.112377379, 43)):
            Circle(SZKIC22_R)
        with Locations((515.112377379, 17)):
            Circle(SZKIC22_R)
    extrude(amount=-WYTNIJ_WYCI_GNI_CIE14_DEPTH, mode=Mode.SUBTRACT)

    # Szkic23 → Wytnij-wyciągnięcie15 (cut, two sides: drawn at the far end of the back side and taken through both)
    with BuildSketch(Plane.XZ.offset(-38).offset(-WYTNIJ_WYCI_GNI_CIE15_DEPTH_BACK)):
        with Locations(Location((-20.299980785, -503.912377379, 0), (0, 0, 270))):
            Circle(SZKIC23_R)
    extrude(amount=WYTNIJ_WYCI_GNI_CIE15_DEPTH + WYTNIJ_WYCI_GNI_CIE15_DEPTH_BACK, mode=Mode.SUBTRACT)

    # Szkic25 → Dodanie-wyciągnięcie10 (add)
    with BuildSketch(Plane.ZY.offset(29.999980785).offset(DODANIE_WYCI_GNI_CIE10_START)):
        with BuildLine():
            Line((-489.212377379, 40), (-489.212377379, 46))
            ThreePointArc((-489.212377379, 46), (-489.798163816, 47.414213562), (-491.212377379, 48))
            Line((-491.212377379, 48), (-514.873742718, 48))
            ThreePointArc((-514.873742718, 48), (-520.530596967, 45.656854249), (-522.873742718, 40))
            Line((-522.873742718, 40), (-522.873742718, 20))
            ThreePointArc((-522.873742718, 20), (-520.530596967, 14.343145751), (-514.873742718, 12))
            Line((-514.873742718, 12), (-491.212377379, 12))
            ThreePointArc((-491.212377379, 12), (-489.798163816, 12.585786438), (-489.212377379, 14))
            Line((-489.212377379, 14), (-489.212377379, 20))
            ThreePointArc((-489.212377379, 20), (-489.798163816, 21.414213562), (-491.212377379, 22))
            Line((-491.212377379, 22), (-512.212377379, 22))
            Line((-512.212377379, 22), (-512.212377379, 38))
            Line((-512.212377379, 38), (-491.212377379, 38))
            ThreePointArc((-491.212377379, 38), (-489.798163816, 38.585786438), (-489.212377379, 40))
        make_face()
    extrude(amount=-DODANIE_WYCI_GNI_CIE10_DEPTH)


solid = part.part
